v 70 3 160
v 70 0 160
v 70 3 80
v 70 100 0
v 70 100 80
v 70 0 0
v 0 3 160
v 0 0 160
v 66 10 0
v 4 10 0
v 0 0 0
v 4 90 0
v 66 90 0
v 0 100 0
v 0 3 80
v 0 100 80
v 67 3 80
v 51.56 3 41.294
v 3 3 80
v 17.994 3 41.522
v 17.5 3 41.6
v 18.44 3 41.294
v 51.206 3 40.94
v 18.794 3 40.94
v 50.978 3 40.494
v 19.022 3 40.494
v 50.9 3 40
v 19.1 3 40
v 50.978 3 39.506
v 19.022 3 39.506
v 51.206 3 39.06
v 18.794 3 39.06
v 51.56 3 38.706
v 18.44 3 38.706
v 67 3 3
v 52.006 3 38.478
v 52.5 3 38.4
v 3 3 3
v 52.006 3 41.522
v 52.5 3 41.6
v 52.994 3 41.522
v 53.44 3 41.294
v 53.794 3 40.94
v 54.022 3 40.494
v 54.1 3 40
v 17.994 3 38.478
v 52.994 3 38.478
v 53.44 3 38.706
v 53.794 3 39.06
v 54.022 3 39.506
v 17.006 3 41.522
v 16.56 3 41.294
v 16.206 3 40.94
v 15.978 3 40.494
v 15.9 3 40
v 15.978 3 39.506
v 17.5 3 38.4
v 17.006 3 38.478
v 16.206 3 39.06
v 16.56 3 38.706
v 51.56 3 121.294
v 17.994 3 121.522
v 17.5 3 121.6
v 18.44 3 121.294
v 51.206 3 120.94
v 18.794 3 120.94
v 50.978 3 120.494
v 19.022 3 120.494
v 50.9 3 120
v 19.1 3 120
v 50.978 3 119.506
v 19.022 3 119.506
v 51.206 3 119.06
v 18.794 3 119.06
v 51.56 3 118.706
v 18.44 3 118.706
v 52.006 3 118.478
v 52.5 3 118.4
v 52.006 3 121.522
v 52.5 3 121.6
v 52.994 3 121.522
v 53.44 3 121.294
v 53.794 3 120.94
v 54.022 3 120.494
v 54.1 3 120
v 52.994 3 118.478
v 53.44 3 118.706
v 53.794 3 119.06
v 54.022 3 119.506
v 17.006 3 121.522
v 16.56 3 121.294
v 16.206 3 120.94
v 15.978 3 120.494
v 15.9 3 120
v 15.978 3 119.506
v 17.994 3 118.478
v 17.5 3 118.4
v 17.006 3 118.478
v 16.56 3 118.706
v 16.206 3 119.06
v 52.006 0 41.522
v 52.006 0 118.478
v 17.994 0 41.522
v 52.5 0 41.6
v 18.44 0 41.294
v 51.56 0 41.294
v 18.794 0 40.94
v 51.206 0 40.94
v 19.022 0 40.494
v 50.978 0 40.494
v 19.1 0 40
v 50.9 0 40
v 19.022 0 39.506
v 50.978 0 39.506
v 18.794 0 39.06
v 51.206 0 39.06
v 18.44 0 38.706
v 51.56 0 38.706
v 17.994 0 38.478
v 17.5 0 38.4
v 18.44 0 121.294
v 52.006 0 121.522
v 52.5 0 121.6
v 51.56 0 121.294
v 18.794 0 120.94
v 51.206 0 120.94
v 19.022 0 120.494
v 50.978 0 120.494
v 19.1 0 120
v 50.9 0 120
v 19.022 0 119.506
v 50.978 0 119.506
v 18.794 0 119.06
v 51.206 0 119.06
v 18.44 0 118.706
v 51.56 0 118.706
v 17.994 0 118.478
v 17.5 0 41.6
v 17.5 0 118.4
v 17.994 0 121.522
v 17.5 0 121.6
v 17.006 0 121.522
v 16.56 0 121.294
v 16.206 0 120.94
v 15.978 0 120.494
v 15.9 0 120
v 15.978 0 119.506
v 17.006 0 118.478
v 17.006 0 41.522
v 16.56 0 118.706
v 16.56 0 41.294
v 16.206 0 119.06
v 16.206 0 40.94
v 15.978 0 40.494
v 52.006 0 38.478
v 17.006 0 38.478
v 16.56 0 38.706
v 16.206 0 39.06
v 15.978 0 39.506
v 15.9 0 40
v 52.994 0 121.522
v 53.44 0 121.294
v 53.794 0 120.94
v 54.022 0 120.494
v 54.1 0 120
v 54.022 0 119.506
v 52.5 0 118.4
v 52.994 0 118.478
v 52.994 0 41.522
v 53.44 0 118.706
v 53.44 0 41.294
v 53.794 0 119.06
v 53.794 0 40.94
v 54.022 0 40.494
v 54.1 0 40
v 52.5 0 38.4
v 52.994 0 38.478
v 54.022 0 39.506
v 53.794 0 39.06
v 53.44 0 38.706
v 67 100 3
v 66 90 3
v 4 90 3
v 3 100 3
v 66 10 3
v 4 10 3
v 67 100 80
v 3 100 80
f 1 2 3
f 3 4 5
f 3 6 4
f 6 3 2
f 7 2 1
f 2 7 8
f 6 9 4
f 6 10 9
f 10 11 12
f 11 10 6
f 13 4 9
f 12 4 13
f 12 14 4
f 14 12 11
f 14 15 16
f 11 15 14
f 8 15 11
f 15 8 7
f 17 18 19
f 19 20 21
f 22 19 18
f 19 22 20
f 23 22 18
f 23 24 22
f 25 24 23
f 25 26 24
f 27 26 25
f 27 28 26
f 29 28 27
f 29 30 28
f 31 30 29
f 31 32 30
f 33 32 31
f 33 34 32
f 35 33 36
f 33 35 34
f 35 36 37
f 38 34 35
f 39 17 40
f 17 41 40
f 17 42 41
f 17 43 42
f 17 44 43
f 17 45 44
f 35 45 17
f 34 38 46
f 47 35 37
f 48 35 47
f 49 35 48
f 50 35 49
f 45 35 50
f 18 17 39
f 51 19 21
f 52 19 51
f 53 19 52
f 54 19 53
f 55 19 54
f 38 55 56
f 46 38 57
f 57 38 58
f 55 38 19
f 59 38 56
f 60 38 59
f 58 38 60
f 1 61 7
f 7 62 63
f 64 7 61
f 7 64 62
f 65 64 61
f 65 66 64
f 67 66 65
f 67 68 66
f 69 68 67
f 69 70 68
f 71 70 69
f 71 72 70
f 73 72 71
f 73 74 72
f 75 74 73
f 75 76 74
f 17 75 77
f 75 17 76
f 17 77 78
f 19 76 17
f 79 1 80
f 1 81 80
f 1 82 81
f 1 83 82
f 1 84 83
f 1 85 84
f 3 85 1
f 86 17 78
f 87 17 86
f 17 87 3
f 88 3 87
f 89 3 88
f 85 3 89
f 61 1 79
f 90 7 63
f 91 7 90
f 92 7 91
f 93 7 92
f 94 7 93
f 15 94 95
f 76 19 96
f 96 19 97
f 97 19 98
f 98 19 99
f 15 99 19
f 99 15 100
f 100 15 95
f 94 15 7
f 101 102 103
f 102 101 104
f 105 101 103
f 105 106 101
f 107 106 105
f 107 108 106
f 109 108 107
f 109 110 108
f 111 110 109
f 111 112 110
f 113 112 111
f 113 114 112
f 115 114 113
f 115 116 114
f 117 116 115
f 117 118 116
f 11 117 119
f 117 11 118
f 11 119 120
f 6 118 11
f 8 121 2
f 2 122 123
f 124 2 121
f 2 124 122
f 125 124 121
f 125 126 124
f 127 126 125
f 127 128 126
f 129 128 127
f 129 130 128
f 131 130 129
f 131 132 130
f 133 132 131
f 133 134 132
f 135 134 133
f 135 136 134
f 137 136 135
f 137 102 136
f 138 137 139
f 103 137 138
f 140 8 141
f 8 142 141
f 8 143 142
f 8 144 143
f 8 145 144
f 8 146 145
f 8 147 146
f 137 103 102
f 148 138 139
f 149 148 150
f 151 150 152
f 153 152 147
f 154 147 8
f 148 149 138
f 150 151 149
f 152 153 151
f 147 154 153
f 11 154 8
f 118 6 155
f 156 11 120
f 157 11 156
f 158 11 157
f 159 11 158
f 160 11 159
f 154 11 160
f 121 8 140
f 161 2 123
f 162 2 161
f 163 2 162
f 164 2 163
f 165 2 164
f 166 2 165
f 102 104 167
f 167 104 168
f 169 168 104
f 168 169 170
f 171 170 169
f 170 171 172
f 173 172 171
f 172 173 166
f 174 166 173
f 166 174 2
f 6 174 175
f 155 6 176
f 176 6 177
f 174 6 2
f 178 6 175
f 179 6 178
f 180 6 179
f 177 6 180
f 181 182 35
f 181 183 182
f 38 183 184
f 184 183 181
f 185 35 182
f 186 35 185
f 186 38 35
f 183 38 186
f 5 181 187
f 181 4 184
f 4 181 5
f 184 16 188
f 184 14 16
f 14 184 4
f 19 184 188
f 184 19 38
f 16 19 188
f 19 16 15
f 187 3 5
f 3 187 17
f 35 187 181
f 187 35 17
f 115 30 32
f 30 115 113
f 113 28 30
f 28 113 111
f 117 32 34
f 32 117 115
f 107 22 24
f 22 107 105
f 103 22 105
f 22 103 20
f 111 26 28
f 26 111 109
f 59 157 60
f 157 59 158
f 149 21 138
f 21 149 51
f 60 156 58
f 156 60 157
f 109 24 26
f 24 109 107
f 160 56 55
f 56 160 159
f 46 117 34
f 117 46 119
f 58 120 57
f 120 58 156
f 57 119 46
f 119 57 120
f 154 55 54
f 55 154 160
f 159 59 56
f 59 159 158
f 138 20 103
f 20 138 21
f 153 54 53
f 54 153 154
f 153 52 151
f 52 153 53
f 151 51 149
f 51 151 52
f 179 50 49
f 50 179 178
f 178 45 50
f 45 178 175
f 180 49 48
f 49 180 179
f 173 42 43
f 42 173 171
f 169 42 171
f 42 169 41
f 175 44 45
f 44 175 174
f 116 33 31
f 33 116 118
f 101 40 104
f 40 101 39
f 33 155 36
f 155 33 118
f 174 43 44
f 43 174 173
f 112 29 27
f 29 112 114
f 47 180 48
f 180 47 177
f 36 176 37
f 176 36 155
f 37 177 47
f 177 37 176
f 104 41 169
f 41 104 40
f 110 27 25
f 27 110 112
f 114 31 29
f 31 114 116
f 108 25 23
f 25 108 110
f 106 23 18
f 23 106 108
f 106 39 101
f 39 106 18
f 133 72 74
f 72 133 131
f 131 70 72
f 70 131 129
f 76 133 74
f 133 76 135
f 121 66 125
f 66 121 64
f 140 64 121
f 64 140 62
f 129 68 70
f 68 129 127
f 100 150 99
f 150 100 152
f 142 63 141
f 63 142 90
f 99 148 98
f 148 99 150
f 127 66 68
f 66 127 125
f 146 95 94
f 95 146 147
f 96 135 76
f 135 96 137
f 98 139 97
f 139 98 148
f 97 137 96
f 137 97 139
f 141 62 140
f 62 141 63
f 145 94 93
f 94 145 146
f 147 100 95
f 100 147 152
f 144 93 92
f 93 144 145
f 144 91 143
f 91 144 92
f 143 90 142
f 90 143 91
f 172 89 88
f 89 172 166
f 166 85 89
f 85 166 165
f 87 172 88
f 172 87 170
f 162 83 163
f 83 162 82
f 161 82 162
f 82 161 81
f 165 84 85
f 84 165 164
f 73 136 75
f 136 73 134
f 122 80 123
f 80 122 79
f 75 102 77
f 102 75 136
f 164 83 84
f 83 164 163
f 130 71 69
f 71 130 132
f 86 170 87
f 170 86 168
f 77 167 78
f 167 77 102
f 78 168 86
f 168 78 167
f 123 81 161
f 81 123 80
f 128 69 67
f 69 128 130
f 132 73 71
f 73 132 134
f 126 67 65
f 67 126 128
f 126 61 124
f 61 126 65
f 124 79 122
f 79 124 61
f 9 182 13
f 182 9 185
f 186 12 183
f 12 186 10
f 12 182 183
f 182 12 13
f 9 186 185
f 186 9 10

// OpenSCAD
// file: ../dimensions.scad
// Shared dimensions for all case components
// This file defines common parameters used across multiple case parts

// --- Wall and Material ---
wall_thickness = 3;

// --- Motherboard (Mini-ITX) ---
mobo_width = 170;
mobo_depth = 170;
mobo_pcb_thickness = 1.6;

// --- Standoffs ---
standoff_height = 6;
standoff_hole_radius = 1.6;  // M3 clearance
standoff_locations = [
    [12.7, 12.7],
    [165.1, 12.7],
    [12.7, 165.1],
    [165.1, 165.1]
];

// --- I/O Shield ---
io_shield_width = 152.4;    // 6 inches
io_shield_height = 33.87;   // 1 1/3 inches
io_shield_x_offset = (mobo_width - io_shield_width) / 2;
io_shield_z_offset = 5;     // 5mm from bottom of plate

// --- Backplate ---
backplate_height = 88.9;    // 3.5 inches
backplate_thickness = wall_thickness;

// --- CPU Cooler (Noctua NH-L12S) ---
cooler_width = 128;
cooler_depth = 146;
cooler_heatsink_height = 70;
cooler_fan_height = 16;
cooler_total_height = cooler_heatsink_height + cooler_fan_height;  // 86mm

// --- Power Supplies ---
// Flex ATX (from technical drawing)
// Orientation: 80mm wide (X), 150mm deep (Y), 40mm tall (Z)
flex_atx_width = 80.0;      // G: Width (X - wider face)
flex_atx_length = 150.0;    // B: Length (Y - depth)
flex_atx_height = 40.0;     // A: Height (Z - shortest side on bottom)

// Flex ATX Mounting holes - 8-32 UNC thread (4 places)
flex_atx_mount_hole_radius = 2.1;   // 8-32 clearance (~4.2mm dia)
flex_atx_mount_h_spacing = 63.5;    // F: Horizontal hole spacing (within 80mm width)
flex_atx_mount_v_spacing = 12.5;    // K: Vertical offset from edges

// SFX
sfx_length = 125;
sfx_width = 100;
sfx_height = 63.5;

// --- Derived Interior Dimensions ---
interior_height = standoff_height + mobo_pcb_thickness + cooler_total_height;  // ~94mm

// --- Minimal Config External Dimensions ---
// Motherboard area only (without PSU)
minimal_mobo_exterior_width = mobo_width + 2 * wall_thickness;   // 176mm
minimal_mobo_exterior_depth = mobo_depth + 2 * wall_thickness;   // 176mm
minimal_exterior_height = interior_height + 2 * wall_thickness;   // ~100mm

// With Flex ATX PSU next to motherboard
minimal_with_psu_width = minimal_mobo_exterior_width + flex_atx_width;  // ~256mm

// --- Ventilation ---
honeycomb_radius = 3;
vent_padding = 5;

// --- Screw Holes for Panel Assembly ---
panel_screw_radius = 1.6;  // M3
panel_screw_inset = 8;     // Distance from edge

// --- GPU ---
gpu_length = 320;          // Max GPU length
gpu_height = 140;          // GPU PCB + cooler height
gpu_width = 60;            // 3 slots

// --- GPU Config External Dimensions ---
// From SPEC.md Section 8.4
gpu_config_width = 171;    // mm
gpu_config_depth = 378;    // mm
gpu_config_height = 190;   // mm

// --- Fans ---
fan_120_size = 120;
fan_120_thickness = 25;
fan_140_size = 140;
fan_140_thickness = 25;

// --- AIO Radiator ---
radiator_240_length = 275;
radiator_240_width = 120;
radiator_240_thickness = 27;

// --- NAS Many-Disk Config ---
// 5-8 drives mounted vertically (on narrowest side)
hdd_width = 101.6;
hdd_length = 147;
hdd_height = 26.1;
nas_many_drive_count = 6;  // Default 6 drives
nas_many_drive_spacing = 5;
nas_many_enclosure_height = hdd_width + wall_thickness + 5;  // ~110mm (drives on side)

// --- Power Inlet C14 ---
c14_width = 50;
c14_height = 27;
c14_depth = 30;
// main file
// Vertical GPU Mounting Bracket
// Holds GPU in vertical orientation with PCIe slot facing down

include <../dimensions.scad>

module gpu_bracket() {
    // Bracket dimensions
    bracket_width = gpu_width + 10;      // GPU width + clearance
    bracket_depth = 100;                  // Support depth
    bracket_height = gpu_height + 20;     // GPU height + margin
    bracket_thickness = 3;

    // GPU slot dimensions
    slot_width = gpu_width + 2;
    slot_depth = bracket_depth - 20;

    // Mount hole positions
    mount_hole_radius = panel_screw_radius;

    color("silver") {
        difference() {
            union() {
                // Back plate (mounts to case)
                cube([bracket_width, bracket_thickness, bracket_height]);

                // Bottom support rail
                translate([0, 0, 0]) {
                    cube([bracket_width, bracket_depth, bracket_thickness]);
                }

                // Side supports
                translate([0, 0, 0]) {
                    cube([bracket_thickness, bracket_depth, bracket_height / 2]);
                }
                translate([bracket_width - bracket_thickness, 0, 0]) {
                    cube([bracket_thickness, bracket_depth, bracket_height / 2]);
                }
            }

            // GPU slot in bottom rail
            translate([(bracket_width - slot_width) / 2, 10, -0.1]) {
                cube([slot_width, slot_depth, bracket_thickness + 0.2]);
            }

            // Mount holes in back plate
            hole_positions = [
                [bracket_width / 4, bracket_height / 4],
                [bracket_width * 3/4, bracket_height / 4],
                [bracket_width / 4, bracket_height * 3/4],
                [bracket_width * 3/4, bracket_height * 3/4]
            ];
            for (pos = hole_positions) {
                translate([pos[0], -0.1, pos[1]]) {
                    rotate([-90, 0, 0]) {
                        cylinder(h = bracket_thickness + 0.2, r = mount_hole_radius, $fn = 20);
                    }
                }
            }
        }
    }
}

// Preview
gpu_bracket();
